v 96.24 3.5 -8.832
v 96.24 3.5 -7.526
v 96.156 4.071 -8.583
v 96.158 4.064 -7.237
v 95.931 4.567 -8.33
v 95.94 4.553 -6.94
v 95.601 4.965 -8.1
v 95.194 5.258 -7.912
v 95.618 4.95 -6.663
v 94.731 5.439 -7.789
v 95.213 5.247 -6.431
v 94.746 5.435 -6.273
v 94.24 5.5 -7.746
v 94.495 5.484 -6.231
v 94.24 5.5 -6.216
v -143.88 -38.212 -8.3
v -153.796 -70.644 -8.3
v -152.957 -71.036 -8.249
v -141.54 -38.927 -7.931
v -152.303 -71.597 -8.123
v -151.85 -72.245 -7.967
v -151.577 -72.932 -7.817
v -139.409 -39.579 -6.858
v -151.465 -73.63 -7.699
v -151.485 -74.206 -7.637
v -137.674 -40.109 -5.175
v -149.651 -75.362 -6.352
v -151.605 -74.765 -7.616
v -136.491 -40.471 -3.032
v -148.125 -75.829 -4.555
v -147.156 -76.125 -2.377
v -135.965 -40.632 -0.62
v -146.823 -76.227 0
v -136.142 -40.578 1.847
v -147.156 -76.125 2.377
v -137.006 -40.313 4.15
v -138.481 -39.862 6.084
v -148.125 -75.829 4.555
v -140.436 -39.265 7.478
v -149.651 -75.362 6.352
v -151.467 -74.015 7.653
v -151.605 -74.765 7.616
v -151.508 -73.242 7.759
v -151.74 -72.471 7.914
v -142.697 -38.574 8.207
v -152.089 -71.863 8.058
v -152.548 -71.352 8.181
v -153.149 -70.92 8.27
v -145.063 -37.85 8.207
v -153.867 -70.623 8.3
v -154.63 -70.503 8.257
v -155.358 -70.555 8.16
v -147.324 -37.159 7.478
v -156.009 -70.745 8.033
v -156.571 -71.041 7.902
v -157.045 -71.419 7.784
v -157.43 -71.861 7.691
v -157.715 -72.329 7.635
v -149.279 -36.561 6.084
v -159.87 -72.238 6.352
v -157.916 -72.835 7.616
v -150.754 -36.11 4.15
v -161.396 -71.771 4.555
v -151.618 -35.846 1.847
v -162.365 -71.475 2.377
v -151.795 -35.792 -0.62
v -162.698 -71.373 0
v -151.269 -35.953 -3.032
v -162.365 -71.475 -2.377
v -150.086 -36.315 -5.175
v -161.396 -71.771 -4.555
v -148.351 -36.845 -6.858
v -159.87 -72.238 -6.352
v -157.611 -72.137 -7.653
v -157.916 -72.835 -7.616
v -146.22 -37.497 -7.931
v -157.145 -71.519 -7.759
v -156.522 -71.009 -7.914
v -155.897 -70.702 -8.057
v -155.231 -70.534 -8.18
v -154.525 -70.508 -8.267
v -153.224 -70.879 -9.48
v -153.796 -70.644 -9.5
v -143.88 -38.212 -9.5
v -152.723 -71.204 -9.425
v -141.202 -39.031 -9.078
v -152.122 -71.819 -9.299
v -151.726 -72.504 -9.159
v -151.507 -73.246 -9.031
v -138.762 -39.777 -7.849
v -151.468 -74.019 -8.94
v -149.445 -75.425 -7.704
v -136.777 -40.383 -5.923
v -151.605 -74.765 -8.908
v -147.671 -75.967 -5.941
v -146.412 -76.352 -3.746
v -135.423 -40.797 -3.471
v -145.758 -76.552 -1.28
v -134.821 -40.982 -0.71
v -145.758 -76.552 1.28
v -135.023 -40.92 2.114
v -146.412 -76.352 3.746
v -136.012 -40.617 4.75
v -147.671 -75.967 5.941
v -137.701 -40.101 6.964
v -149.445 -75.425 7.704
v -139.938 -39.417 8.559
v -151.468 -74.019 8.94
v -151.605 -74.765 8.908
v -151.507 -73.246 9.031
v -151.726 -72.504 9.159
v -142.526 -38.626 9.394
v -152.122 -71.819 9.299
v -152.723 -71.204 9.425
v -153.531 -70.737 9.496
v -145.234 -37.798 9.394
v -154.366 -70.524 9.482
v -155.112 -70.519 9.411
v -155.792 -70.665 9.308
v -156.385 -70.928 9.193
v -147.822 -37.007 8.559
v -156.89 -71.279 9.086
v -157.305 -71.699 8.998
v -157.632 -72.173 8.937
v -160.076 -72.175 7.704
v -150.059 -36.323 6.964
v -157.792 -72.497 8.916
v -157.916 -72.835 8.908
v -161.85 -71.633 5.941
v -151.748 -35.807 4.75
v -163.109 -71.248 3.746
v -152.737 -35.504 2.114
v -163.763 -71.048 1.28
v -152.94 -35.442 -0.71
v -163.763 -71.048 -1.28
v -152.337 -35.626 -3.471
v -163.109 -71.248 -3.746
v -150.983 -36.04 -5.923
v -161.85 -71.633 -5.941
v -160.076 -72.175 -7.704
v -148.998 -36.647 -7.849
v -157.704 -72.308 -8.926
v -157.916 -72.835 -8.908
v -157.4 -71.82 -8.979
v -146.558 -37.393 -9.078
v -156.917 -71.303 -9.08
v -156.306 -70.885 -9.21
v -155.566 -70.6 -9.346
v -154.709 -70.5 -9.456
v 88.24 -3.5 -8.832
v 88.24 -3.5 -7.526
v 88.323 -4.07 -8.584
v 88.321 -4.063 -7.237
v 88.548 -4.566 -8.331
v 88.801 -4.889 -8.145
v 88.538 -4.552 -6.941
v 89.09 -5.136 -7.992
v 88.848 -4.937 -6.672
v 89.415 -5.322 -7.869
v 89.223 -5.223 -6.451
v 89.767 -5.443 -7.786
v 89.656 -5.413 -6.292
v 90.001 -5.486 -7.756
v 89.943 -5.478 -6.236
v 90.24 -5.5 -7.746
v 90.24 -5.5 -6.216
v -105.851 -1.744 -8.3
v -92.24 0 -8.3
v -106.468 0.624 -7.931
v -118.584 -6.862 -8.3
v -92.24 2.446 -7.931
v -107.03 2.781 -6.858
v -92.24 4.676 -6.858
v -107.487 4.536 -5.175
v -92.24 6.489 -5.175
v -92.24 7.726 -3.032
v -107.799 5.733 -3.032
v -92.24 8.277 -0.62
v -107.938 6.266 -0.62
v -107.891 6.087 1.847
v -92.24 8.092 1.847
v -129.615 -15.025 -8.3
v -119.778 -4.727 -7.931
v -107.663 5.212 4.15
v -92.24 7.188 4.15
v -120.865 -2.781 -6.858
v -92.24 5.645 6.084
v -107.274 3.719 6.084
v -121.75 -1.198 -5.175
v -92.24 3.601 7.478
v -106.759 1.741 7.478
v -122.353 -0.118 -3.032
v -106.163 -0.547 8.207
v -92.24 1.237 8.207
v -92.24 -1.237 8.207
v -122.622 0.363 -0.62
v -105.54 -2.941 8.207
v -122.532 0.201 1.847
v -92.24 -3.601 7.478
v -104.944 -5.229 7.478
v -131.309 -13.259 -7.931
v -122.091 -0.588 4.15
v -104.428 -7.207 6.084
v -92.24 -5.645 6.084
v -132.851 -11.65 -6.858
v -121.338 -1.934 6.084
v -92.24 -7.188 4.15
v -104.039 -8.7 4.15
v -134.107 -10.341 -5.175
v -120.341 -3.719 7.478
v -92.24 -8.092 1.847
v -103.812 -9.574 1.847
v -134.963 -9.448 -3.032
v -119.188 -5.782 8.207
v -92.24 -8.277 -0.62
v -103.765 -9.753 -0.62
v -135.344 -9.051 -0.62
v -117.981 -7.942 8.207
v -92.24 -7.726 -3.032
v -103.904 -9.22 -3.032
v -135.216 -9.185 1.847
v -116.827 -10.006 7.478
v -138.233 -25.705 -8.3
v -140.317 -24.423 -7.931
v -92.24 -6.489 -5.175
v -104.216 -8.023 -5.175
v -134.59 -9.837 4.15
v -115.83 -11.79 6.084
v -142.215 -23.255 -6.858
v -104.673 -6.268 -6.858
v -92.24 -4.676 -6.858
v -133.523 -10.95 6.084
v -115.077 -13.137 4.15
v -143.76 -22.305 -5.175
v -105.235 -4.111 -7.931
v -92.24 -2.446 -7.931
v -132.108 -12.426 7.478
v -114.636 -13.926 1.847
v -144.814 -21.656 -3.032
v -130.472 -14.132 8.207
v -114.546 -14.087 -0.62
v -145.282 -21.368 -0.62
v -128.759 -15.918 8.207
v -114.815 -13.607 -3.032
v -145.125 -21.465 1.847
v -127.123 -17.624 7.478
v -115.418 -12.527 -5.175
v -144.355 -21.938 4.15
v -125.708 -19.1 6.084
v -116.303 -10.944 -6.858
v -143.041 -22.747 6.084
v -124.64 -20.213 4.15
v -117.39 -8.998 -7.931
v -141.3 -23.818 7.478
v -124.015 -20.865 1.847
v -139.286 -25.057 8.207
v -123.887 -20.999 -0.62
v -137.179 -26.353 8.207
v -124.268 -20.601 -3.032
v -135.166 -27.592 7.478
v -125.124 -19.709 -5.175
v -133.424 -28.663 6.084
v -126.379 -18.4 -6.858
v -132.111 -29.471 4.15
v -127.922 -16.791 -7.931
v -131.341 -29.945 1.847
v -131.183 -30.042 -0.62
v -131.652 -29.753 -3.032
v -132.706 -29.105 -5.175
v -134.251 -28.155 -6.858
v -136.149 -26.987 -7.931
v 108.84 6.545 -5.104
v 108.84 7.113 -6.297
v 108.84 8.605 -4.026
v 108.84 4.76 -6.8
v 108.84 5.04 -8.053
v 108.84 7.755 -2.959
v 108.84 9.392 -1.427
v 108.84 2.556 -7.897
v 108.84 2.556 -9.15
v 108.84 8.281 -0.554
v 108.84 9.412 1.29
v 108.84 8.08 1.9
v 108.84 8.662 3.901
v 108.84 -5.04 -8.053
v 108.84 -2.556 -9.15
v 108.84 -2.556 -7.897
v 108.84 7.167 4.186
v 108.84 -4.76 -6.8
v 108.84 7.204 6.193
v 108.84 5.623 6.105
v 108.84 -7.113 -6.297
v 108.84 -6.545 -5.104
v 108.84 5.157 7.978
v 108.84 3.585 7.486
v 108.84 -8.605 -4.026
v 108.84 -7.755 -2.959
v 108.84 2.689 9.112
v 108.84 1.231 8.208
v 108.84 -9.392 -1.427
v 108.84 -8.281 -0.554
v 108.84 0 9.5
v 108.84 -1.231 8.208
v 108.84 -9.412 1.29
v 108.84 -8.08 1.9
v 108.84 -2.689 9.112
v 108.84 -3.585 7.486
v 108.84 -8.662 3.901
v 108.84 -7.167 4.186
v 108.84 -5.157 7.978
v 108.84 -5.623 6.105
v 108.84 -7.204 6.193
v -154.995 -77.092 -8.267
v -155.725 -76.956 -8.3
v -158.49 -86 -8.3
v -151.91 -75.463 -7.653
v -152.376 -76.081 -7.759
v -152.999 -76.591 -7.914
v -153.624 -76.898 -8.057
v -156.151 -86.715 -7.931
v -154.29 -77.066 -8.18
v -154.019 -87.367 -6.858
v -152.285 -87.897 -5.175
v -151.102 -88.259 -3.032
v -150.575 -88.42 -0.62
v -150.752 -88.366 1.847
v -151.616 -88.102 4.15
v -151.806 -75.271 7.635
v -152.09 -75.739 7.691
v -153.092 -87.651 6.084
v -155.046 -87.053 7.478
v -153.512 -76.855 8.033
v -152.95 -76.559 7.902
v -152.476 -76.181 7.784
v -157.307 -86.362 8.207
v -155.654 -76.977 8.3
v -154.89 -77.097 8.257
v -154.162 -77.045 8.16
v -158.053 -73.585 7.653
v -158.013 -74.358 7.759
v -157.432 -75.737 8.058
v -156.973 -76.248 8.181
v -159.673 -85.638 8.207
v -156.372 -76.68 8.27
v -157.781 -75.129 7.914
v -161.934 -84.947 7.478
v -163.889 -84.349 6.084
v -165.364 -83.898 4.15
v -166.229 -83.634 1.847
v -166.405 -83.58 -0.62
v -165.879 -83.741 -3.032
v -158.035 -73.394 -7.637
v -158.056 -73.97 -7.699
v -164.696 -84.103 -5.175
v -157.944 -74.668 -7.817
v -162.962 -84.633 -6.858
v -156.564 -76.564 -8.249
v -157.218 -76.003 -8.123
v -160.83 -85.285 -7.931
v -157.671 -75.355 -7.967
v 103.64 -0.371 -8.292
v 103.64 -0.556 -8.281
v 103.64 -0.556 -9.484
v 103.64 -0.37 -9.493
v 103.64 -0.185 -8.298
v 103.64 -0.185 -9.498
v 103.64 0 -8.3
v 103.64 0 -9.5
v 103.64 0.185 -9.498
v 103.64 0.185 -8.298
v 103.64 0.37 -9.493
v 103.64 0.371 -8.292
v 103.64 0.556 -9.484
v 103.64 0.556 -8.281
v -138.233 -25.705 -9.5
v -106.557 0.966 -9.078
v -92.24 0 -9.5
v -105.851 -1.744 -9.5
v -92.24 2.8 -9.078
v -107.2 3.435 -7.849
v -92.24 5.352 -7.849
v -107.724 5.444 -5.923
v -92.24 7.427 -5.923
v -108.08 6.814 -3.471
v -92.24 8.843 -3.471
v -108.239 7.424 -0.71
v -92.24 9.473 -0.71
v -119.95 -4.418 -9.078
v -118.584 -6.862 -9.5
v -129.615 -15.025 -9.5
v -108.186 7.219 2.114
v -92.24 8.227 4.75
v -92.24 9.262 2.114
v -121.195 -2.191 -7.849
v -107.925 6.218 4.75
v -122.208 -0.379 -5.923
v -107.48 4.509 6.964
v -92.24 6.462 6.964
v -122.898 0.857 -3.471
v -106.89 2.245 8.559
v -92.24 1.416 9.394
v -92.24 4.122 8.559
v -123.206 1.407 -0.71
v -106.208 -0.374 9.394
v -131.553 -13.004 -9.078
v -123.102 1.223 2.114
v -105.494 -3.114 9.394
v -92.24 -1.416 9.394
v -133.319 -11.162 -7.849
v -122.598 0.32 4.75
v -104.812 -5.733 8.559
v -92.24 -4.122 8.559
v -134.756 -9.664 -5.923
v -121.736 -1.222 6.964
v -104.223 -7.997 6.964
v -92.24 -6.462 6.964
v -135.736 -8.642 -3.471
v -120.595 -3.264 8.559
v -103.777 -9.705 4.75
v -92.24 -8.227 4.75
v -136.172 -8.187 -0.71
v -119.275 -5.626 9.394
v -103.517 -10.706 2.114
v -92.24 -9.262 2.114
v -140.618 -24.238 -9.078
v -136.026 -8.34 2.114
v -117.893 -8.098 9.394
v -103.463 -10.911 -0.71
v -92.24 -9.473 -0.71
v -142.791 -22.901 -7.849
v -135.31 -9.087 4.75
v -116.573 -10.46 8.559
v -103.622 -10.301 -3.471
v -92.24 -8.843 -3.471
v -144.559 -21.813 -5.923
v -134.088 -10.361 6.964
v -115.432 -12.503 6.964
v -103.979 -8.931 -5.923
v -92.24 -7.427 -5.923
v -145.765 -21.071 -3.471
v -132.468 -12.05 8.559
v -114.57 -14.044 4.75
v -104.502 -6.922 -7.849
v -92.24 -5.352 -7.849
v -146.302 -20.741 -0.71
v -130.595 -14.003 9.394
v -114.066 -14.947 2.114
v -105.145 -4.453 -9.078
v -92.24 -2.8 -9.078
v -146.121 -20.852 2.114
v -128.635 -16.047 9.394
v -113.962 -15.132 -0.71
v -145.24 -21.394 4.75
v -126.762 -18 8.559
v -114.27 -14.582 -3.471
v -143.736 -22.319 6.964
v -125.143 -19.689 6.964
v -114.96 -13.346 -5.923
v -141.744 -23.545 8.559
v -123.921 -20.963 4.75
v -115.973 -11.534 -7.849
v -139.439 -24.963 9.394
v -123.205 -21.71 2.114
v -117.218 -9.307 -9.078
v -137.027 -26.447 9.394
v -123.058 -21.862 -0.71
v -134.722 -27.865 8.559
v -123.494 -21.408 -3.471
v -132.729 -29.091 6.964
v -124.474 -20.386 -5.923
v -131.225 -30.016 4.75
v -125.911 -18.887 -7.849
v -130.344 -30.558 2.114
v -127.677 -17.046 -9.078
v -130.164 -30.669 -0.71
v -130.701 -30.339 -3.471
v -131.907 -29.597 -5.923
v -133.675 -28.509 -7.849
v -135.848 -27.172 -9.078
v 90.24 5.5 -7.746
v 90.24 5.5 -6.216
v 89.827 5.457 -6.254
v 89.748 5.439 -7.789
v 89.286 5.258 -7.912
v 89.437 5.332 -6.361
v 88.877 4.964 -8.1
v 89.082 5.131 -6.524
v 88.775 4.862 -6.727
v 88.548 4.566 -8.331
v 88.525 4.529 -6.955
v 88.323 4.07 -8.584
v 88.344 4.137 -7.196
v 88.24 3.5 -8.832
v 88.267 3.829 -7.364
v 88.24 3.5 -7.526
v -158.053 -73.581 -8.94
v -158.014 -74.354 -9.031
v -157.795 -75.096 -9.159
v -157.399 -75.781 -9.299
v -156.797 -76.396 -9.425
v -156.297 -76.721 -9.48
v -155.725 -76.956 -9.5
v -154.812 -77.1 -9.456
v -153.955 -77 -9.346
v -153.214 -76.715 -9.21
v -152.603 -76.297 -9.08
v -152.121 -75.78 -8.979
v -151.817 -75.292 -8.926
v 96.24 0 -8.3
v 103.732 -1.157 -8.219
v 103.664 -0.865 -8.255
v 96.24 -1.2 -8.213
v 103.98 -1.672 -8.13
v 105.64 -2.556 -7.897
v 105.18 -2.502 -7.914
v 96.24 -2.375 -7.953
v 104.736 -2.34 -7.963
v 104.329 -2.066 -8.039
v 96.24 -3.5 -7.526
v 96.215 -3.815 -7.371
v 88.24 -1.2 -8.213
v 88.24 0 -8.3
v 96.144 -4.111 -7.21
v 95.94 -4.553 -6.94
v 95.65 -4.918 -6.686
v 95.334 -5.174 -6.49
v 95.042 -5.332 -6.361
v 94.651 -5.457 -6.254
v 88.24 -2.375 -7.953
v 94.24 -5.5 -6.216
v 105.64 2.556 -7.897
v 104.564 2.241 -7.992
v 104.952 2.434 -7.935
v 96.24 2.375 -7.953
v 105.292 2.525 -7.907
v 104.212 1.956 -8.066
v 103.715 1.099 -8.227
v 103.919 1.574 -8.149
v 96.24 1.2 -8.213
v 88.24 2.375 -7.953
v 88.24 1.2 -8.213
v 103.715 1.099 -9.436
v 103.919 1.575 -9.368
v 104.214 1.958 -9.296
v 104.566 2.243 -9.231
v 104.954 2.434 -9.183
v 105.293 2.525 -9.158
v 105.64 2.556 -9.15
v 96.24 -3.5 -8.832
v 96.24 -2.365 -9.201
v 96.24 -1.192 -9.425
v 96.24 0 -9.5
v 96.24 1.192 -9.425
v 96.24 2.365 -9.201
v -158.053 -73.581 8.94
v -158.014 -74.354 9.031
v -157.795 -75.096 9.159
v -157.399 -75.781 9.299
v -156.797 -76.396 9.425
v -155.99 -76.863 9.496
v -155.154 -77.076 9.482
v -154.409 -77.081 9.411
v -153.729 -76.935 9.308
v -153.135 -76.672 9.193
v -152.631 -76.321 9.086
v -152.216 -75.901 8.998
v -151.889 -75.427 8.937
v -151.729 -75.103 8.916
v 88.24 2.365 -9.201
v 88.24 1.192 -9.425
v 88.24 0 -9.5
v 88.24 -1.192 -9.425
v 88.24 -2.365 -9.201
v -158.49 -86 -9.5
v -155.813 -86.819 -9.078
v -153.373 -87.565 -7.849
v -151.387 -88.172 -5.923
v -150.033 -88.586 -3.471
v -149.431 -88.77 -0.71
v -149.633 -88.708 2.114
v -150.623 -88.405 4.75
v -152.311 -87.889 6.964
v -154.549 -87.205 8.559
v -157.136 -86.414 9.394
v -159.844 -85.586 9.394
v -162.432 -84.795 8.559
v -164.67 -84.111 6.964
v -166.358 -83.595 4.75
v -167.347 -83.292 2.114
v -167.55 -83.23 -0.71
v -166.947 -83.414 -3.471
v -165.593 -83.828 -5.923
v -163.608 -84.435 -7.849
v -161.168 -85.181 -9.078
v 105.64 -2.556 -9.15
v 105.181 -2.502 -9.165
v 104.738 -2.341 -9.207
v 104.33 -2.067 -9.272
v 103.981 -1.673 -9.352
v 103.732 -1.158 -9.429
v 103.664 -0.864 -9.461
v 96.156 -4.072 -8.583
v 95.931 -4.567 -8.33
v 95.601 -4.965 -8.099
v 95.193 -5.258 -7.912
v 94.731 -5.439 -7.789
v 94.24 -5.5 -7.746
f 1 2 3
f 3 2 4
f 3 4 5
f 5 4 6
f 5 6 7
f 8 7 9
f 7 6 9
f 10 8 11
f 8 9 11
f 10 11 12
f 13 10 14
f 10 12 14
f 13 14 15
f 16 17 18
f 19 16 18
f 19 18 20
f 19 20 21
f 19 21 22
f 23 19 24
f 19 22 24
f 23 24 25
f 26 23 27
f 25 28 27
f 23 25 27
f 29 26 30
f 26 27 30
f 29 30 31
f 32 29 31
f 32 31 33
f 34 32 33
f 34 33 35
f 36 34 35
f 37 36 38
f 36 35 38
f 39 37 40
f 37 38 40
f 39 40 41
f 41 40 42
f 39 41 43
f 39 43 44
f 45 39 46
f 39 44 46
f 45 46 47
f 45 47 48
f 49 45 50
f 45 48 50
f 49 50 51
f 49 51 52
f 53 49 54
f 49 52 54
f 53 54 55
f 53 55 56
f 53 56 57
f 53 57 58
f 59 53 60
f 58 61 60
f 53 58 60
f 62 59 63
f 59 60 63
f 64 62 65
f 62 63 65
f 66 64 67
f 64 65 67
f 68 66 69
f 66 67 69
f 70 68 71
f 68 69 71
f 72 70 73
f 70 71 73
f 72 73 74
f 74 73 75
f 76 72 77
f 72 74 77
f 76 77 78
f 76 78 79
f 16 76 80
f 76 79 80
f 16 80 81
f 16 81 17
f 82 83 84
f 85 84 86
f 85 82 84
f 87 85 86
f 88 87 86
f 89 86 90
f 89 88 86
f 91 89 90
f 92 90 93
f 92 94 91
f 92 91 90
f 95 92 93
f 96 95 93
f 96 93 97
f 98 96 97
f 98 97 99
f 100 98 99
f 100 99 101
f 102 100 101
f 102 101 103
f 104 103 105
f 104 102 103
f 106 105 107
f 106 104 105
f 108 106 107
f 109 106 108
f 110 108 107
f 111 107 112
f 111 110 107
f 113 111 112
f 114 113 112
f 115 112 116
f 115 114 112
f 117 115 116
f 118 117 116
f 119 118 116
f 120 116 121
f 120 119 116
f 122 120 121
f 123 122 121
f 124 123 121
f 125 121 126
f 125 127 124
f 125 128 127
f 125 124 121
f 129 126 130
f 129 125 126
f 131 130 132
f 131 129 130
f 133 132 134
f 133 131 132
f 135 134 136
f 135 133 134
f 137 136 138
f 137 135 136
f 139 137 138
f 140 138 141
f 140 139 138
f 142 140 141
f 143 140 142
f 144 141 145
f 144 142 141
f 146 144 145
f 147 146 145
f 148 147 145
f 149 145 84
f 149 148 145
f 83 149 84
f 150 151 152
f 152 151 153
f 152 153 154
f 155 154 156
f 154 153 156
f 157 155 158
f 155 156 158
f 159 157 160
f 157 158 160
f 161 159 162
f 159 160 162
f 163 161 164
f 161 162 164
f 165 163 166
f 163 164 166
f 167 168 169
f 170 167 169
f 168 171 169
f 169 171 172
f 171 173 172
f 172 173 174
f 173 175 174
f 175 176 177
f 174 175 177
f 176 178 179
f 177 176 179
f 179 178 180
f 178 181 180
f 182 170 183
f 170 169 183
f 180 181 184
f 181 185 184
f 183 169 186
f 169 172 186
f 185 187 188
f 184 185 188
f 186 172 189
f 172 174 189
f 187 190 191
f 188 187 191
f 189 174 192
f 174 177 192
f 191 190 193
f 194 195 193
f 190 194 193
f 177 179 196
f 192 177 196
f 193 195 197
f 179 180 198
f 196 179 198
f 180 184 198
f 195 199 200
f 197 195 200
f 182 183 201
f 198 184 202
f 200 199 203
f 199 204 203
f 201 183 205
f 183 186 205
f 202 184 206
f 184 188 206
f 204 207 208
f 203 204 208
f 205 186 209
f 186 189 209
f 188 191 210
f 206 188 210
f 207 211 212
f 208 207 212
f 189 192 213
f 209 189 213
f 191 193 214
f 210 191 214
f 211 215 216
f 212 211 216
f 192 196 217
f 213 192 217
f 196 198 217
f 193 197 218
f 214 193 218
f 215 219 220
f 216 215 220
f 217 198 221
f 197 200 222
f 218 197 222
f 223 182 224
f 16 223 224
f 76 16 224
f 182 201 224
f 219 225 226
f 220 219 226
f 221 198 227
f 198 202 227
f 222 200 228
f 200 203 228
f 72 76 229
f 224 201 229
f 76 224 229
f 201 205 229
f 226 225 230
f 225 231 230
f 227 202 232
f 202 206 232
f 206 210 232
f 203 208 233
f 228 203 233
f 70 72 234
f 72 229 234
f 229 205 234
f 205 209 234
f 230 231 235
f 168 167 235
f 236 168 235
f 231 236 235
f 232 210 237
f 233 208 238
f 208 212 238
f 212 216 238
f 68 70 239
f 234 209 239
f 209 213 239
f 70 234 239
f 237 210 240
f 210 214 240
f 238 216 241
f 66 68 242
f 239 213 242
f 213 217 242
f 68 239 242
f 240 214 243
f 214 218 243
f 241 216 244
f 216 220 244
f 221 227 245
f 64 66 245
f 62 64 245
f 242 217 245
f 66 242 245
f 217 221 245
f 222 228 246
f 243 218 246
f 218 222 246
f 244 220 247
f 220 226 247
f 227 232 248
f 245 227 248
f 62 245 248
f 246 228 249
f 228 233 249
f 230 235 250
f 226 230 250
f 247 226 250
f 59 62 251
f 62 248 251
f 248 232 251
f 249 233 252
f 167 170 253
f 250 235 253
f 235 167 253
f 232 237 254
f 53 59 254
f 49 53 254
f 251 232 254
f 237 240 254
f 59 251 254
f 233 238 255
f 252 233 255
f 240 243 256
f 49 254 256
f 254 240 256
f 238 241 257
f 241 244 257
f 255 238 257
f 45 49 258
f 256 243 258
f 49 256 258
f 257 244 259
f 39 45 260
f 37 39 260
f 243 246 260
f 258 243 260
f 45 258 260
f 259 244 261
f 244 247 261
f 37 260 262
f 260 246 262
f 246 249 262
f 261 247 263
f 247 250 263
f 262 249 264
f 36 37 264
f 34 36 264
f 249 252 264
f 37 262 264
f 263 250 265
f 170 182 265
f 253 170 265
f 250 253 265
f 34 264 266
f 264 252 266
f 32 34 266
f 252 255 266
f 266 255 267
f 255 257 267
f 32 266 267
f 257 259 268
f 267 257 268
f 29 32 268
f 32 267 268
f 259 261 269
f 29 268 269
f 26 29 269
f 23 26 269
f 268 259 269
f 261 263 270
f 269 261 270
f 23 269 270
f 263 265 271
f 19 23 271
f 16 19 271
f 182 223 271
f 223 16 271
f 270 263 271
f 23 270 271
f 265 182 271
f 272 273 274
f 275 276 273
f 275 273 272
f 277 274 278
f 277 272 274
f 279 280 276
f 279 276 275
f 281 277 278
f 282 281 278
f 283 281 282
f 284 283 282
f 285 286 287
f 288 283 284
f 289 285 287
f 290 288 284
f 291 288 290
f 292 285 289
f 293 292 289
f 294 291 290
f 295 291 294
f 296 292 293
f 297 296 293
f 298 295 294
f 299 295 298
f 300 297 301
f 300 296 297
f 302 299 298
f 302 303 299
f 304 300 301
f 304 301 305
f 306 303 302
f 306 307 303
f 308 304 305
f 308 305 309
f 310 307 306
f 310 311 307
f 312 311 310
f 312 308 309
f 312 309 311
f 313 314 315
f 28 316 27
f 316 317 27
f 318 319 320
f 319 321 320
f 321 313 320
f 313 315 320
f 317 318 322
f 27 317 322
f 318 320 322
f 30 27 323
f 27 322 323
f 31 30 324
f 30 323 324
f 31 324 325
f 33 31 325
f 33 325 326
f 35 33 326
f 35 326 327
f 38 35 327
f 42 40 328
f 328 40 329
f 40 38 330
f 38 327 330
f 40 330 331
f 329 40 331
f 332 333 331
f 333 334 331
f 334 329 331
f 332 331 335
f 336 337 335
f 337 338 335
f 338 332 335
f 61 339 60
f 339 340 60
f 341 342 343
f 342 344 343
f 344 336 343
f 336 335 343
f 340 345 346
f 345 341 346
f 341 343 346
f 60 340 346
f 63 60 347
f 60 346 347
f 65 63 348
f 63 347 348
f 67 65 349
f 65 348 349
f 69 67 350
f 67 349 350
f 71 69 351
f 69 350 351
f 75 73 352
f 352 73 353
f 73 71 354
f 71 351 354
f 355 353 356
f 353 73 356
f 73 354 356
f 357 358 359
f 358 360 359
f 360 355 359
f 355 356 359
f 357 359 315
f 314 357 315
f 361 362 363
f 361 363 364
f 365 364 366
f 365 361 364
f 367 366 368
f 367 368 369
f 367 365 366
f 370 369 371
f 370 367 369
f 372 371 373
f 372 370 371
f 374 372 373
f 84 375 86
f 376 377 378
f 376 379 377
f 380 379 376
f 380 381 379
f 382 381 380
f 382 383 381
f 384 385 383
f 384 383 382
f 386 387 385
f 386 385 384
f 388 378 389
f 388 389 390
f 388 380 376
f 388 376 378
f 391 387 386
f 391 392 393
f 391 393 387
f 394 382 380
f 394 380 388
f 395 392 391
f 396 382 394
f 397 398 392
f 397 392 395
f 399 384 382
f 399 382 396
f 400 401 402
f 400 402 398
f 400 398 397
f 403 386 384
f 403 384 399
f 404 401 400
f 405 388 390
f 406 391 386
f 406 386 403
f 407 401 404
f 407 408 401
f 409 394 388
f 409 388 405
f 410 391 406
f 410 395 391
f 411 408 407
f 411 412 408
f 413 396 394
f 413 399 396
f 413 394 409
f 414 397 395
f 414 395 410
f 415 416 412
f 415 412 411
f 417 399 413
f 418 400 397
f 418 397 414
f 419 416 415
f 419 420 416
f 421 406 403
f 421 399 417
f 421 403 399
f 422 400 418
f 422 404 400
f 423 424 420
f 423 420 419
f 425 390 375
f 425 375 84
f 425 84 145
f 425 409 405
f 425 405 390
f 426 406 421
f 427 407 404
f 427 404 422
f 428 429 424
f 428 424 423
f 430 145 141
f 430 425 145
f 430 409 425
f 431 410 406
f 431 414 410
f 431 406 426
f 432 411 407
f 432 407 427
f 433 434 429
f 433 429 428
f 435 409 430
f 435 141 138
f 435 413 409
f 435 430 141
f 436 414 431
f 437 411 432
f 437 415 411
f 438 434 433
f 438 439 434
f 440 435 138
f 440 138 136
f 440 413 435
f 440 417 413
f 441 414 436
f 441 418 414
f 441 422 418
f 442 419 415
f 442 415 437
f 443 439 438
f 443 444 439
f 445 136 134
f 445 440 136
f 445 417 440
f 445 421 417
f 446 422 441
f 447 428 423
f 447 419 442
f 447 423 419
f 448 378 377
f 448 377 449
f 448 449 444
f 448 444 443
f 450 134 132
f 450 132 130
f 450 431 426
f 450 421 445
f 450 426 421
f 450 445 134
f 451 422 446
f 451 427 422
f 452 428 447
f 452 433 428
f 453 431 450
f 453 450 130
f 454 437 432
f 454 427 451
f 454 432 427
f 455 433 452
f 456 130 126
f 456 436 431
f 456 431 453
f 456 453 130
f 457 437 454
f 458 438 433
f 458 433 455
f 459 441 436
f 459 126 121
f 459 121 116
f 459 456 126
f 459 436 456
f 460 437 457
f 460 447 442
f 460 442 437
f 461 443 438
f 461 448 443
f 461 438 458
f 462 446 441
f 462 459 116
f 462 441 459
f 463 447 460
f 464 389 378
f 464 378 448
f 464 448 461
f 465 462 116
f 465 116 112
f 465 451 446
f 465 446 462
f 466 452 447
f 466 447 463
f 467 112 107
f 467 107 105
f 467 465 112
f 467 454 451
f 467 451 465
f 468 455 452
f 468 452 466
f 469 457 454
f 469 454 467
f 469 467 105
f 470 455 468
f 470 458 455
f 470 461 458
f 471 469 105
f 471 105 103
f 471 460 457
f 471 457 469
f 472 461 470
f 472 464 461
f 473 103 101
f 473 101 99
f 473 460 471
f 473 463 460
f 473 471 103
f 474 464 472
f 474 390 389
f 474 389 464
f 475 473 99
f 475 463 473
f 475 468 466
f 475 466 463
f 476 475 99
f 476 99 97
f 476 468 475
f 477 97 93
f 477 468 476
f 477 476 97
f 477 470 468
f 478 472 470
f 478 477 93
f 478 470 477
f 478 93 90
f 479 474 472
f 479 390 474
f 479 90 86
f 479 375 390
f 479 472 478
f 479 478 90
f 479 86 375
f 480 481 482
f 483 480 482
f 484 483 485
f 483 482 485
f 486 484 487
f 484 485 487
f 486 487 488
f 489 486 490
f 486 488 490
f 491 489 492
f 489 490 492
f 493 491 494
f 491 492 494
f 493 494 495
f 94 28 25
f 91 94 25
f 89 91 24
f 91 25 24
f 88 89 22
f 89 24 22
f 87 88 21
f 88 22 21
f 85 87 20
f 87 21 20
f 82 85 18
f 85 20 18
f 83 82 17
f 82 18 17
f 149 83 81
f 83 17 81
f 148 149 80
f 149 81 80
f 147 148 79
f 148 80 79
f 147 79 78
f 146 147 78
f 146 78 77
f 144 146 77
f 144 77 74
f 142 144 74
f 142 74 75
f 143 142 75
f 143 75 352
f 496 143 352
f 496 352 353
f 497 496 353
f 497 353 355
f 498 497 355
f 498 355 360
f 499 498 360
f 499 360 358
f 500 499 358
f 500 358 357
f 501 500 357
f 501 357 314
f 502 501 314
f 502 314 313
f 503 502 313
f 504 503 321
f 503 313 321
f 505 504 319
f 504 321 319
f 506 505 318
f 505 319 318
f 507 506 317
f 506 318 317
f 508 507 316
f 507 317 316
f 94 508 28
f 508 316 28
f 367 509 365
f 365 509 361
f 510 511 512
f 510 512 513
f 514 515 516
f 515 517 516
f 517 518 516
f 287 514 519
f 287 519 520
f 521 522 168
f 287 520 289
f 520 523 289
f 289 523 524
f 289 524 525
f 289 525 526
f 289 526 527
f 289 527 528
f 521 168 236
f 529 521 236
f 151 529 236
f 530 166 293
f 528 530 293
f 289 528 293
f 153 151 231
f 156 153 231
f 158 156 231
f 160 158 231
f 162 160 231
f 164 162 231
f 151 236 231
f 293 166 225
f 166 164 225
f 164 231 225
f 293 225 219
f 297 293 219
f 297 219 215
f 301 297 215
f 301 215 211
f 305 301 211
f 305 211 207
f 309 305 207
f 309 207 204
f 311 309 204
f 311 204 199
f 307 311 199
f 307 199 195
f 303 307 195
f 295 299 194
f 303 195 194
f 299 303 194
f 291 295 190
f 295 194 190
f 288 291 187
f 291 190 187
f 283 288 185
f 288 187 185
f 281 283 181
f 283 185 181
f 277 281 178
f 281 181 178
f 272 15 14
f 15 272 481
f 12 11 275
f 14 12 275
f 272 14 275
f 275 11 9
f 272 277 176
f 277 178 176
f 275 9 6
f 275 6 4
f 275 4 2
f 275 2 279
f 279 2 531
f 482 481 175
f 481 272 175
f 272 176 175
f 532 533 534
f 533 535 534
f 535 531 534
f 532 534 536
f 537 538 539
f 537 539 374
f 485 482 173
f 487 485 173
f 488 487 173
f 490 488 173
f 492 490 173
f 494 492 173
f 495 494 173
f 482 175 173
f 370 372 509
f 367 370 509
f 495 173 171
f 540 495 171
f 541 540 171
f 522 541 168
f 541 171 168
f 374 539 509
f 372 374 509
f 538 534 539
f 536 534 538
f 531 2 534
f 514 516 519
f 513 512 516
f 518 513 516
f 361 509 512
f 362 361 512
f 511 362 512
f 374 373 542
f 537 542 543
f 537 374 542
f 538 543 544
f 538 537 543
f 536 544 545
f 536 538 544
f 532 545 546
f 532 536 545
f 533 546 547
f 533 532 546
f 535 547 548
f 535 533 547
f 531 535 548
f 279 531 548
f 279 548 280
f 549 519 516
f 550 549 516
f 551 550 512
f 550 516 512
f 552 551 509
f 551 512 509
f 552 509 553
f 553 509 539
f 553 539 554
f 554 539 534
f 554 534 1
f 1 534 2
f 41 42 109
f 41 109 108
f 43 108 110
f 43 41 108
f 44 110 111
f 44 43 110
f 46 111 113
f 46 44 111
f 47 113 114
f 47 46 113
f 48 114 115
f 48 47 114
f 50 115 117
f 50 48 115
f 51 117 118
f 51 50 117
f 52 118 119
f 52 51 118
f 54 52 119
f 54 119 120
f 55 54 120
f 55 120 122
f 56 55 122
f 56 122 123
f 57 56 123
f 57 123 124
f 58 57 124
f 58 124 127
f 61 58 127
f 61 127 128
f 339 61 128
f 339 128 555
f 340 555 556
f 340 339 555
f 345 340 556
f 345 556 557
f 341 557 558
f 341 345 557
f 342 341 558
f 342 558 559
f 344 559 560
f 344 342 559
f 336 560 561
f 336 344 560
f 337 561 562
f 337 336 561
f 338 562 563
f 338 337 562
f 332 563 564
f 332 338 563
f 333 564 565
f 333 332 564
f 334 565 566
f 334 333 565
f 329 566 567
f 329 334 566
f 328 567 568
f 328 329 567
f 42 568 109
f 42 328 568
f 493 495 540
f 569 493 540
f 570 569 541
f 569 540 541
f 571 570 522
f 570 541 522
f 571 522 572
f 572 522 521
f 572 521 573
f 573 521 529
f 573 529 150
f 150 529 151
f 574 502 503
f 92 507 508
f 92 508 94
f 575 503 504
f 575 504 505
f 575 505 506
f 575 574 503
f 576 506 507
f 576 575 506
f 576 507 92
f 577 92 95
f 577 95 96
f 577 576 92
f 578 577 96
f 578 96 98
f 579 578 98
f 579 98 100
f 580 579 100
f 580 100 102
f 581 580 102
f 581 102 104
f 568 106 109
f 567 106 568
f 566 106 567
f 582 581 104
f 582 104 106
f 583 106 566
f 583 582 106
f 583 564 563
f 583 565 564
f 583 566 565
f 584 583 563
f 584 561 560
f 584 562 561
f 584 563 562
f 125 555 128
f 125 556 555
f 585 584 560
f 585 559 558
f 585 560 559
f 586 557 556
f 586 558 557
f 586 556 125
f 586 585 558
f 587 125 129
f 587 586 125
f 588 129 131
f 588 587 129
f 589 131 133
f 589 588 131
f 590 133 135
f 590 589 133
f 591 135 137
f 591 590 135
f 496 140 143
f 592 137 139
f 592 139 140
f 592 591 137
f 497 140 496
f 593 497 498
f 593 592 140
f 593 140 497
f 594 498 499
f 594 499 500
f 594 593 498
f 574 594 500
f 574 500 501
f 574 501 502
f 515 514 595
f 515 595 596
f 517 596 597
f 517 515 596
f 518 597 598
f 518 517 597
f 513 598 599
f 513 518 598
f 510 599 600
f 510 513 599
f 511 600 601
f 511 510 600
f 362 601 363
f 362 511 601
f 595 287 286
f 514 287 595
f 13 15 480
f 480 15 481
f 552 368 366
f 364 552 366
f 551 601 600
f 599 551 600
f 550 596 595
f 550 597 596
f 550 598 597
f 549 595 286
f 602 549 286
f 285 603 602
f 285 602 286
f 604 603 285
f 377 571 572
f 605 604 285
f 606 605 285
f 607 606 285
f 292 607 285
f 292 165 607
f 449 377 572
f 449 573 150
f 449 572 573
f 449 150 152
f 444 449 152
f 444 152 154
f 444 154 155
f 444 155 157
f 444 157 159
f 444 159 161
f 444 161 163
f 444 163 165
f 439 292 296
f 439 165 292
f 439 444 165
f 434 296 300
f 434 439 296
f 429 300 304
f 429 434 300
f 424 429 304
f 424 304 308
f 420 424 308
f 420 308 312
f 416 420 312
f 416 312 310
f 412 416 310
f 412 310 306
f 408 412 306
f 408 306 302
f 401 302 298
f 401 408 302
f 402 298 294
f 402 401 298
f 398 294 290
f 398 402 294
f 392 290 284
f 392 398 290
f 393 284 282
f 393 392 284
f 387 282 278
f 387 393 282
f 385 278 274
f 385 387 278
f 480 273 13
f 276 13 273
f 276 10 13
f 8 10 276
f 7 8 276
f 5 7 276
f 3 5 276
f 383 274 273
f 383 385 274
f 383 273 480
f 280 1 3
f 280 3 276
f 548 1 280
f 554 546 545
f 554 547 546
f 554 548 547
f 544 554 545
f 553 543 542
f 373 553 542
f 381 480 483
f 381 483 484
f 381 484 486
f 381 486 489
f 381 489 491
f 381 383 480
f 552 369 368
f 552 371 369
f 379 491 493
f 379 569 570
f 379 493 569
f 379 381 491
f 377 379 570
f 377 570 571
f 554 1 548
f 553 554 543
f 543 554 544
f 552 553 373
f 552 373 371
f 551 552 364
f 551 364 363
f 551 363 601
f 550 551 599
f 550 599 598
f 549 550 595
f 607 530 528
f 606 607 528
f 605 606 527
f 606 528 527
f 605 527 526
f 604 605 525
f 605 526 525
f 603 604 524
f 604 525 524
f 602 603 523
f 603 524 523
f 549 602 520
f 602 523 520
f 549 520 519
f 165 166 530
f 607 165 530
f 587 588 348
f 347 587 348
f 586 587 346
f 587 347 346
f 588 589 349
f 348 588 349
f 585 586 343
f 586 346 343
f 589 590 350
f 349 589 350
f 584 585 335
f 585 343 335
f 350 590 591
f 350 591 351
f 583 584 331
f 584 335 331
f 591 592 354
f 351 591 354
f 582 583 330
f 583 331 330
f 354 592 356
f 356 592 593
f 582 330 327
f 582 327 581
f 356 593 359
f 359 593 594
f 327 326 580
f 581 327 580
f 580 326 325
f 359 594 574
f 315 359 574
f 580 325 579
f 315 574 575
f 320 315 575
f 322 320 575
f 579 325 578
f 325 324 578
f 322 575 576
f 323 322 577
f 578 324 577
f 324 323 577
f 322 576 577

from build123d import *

# Parameters (mm, degrees)
SKETCH3_R          = 9.5
SKETCH3_R_2        = 8.3
CUT_EXTRUDE1_REACH = 191.877
SKETCH4_R          = 3.3
SKETCH5_R          = 3.3
CUT_EXTRUDE2_DEPTH = 190.876682823


with BuildPart() as part:
    # Sweep2: sweep along a path in Sketch1
    with BuildLine(Plane.XY) as sweep2_path:
        Line((108.839588828, 0), (92.239588828, 0))
        Line((92.239588828, 0), (-92.239588828, 0))
        ThreePointArc((-92.239588828, 0), (-124.360019313, -10.591729527), (-143.88004565, -38.211927945))
        Line((-143.88004565, -38.211927945), (-154.760411172, -73.8))
        Line((-154.760411172, -73.8), (-158.490325485, -86))
    # Sketch3 → Sweep2 (sweep)
    with BuildSketch(Plane(origin=(92.239588828, 0, 0), x_dir=(0, 0, -1), z_dir=(1, 0, 0))):
        Circle(SKETCH3_R)
        Circle(SKETCH3_R_2, mode=Mode.SUBTRACT)
    sweep(path=sweep2_path.line)

    # Sketch4 → Cut-Extrude1 (cut, up to next)
    with BuildSketch(Plane.XY, mode=Mode.PRIVATE) as cut_extrude1_sk1:
        with Locations((-154.760411172, -73.8)):
            Circle(SKETCH4_R)
    cut_extrude1_tool1 = extrude(cut_extrude1_sk1.sketch, amount=-CUT_EXTRUDE1_REACH, mode=Mode.PRIVATE) & part.part
    # Sketch4 → Cut-Extrude1 (cut, up to next)
    with BuildSketch(Plane.XY, mode=Mode.PRIVATE) as cut_extrude1_sk2:
        with BuildLine():
            Line((108.839588828, 2.555545653), (108.839588828, -2.555545653))
            Line((108.839588828, -2.555545653), (105.639588828, -2.555545653))
            ThreePointArc((105.639588828, -2.555545653), (104.225375266, -1.969759216), (103.639588828, -0.555545653))
            Line((103.639588828, -0.555545653), (103.639588828, 0.555545653))
            ThreePointArc((103.639588828, 0.555545653), (104.225375266, 1.969759216), (105.639588828, 2.555545653))
            Line((105.639588828, 2.555545653), (108.839588828, 2.555545653))
        make_face()
    cut_extrude1_tool2 = extrude(cut_extrude1_sk2.sketch, amount=-CUT_EXTRUDE1_REACH, mode=Mode.PRIVATE) & part.part
    # Sketch4 → Cut-Extrude1 (cut, up to next)
    with BuildSketch(Plane.XY, mode=Mode.PRIVATE) as cut_extrude1_sk3:
        with BuildLine():
            Line((90.239588828, -5.5), (94.239588828, -5.5))
            ThreePointArc((94.239588828, -5.5), (95.653802391, -4.914213562), (96.239588828, -3.5))
            Line((96.239588828, -3.5), (96.239588828, 3.5))
            ThreePointArc((96.239588828, 3.5), (95.653802391, 4.914213562), (94.239588828, 5.5))
            Line((94.239588828, 5.5), (90.239588828, 5.5))
            ThreePointArc((90.239588828, 5.5), (88.825375266, 4.914213562), (88.239588828, 3.5))
            Line((88.239588828, 3.5), (88.239588828, -3.5))
            ThreePointArc((88.239588828, -3.5), (88.825375266, -4.914213562), (90.239588828, -5.5))
        make_face()
    cut_extrude1_tool3 = extrude(cut_extrude1_sk3.sketch, amount=-CUT_EXTRUDE1_REACH, mode=Mode.PRIVATE) & part.part
    add(cut_extrude1_tool1.solids().sort_by_distance((-154.760411, -73.8, 0))[0], mode=Mode.SUBTRACT)
    add(cut_extrude1_tool2.solids().sort_by_distance((106.388287, 0, 0))[0], mode=Mode.SUBTRACT)
    add(cut_extrude1_tool3.solids().sort_by_distance((92.239589, 0, 0))[0], mode=Mode.SUBTRACT)

    # Sketch5 → Cut-Extrude2 (cut, through all)
    with BuildSketch(Plane.XY):
        with Locations((-154.760411172, -73.8)):
            Circle(SKETCH5_R)
    extrude(amount=CUT_EXTRUDE2_DEPTH, mode=Mode.SUBTRACT)


solid = part.part
